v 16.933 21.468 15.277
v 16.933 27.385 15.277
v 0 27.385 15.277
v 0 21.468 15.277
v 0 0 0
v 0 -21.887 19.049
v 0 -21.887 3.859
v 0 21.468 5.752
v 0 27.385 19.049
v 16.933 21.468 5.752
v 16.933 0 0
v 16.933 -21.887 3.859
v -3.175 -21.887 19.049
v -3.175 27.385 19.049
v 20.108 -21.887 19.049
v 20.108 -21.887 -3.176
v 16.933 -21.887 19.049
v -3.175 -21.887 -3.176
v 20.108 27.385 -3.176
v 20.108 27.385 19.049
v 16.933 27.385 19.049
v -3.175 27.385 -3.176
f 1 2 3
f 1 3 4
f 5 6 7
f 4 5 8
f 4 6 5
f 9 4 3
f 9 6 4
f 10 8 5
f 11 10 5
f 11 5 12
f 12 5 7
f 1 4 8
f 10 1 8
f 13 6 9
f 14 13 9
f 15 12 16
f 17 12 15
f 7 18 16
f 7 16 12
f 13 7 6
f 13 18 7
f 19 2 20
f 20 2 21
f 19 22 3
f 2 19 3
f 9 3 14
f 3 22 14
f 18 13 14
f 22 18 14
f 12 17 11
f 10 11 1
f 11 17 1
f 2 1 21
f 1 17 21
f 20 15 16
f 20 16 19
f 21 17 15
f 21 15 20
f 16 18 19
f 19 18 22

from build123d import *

# Parameters (mm, degrees)
F1_DEPTH = 16.933333
F2_W     = 49.271976
F2_H     = 22.225
F3_DEPTH = 3.175
F4_W     = 49.271976
F4_H     = 22.225
F5_DEPTH = 3.175


with BuildPart() as f1:
    # F0 (on Right) → F1 (new body)
    with BuildSketch(Plane.YZ):
        Polygon((21.467701, 5.752253), (0, 0), (-21.887352, 3.859331), (-21.887352, -3.175847), (27.384624, -3.175847), (27.384624, 15.277253), (21.467701, 15.277253), align=None)
    extrude(amount=F1_DEPTH)

    # F2 (on Right) → F3 (join)
    with BuildSketch(Plane.YZ):
        with Locations((2.748636, 7.936653)):
            Rectangle(F2_W, F2_H)
    extrude(amount=-F3_DEPTH)

    # F4 (on face) → F5 (join)
    with BuildSketch(Plane.YZ.offset(16.933333)):
        with Locations((2.748636, 7.936653)):
            Rectangle(F4_W, F4_H)
    extrude(amount=F5_DEPTH)


solid = f1.part
